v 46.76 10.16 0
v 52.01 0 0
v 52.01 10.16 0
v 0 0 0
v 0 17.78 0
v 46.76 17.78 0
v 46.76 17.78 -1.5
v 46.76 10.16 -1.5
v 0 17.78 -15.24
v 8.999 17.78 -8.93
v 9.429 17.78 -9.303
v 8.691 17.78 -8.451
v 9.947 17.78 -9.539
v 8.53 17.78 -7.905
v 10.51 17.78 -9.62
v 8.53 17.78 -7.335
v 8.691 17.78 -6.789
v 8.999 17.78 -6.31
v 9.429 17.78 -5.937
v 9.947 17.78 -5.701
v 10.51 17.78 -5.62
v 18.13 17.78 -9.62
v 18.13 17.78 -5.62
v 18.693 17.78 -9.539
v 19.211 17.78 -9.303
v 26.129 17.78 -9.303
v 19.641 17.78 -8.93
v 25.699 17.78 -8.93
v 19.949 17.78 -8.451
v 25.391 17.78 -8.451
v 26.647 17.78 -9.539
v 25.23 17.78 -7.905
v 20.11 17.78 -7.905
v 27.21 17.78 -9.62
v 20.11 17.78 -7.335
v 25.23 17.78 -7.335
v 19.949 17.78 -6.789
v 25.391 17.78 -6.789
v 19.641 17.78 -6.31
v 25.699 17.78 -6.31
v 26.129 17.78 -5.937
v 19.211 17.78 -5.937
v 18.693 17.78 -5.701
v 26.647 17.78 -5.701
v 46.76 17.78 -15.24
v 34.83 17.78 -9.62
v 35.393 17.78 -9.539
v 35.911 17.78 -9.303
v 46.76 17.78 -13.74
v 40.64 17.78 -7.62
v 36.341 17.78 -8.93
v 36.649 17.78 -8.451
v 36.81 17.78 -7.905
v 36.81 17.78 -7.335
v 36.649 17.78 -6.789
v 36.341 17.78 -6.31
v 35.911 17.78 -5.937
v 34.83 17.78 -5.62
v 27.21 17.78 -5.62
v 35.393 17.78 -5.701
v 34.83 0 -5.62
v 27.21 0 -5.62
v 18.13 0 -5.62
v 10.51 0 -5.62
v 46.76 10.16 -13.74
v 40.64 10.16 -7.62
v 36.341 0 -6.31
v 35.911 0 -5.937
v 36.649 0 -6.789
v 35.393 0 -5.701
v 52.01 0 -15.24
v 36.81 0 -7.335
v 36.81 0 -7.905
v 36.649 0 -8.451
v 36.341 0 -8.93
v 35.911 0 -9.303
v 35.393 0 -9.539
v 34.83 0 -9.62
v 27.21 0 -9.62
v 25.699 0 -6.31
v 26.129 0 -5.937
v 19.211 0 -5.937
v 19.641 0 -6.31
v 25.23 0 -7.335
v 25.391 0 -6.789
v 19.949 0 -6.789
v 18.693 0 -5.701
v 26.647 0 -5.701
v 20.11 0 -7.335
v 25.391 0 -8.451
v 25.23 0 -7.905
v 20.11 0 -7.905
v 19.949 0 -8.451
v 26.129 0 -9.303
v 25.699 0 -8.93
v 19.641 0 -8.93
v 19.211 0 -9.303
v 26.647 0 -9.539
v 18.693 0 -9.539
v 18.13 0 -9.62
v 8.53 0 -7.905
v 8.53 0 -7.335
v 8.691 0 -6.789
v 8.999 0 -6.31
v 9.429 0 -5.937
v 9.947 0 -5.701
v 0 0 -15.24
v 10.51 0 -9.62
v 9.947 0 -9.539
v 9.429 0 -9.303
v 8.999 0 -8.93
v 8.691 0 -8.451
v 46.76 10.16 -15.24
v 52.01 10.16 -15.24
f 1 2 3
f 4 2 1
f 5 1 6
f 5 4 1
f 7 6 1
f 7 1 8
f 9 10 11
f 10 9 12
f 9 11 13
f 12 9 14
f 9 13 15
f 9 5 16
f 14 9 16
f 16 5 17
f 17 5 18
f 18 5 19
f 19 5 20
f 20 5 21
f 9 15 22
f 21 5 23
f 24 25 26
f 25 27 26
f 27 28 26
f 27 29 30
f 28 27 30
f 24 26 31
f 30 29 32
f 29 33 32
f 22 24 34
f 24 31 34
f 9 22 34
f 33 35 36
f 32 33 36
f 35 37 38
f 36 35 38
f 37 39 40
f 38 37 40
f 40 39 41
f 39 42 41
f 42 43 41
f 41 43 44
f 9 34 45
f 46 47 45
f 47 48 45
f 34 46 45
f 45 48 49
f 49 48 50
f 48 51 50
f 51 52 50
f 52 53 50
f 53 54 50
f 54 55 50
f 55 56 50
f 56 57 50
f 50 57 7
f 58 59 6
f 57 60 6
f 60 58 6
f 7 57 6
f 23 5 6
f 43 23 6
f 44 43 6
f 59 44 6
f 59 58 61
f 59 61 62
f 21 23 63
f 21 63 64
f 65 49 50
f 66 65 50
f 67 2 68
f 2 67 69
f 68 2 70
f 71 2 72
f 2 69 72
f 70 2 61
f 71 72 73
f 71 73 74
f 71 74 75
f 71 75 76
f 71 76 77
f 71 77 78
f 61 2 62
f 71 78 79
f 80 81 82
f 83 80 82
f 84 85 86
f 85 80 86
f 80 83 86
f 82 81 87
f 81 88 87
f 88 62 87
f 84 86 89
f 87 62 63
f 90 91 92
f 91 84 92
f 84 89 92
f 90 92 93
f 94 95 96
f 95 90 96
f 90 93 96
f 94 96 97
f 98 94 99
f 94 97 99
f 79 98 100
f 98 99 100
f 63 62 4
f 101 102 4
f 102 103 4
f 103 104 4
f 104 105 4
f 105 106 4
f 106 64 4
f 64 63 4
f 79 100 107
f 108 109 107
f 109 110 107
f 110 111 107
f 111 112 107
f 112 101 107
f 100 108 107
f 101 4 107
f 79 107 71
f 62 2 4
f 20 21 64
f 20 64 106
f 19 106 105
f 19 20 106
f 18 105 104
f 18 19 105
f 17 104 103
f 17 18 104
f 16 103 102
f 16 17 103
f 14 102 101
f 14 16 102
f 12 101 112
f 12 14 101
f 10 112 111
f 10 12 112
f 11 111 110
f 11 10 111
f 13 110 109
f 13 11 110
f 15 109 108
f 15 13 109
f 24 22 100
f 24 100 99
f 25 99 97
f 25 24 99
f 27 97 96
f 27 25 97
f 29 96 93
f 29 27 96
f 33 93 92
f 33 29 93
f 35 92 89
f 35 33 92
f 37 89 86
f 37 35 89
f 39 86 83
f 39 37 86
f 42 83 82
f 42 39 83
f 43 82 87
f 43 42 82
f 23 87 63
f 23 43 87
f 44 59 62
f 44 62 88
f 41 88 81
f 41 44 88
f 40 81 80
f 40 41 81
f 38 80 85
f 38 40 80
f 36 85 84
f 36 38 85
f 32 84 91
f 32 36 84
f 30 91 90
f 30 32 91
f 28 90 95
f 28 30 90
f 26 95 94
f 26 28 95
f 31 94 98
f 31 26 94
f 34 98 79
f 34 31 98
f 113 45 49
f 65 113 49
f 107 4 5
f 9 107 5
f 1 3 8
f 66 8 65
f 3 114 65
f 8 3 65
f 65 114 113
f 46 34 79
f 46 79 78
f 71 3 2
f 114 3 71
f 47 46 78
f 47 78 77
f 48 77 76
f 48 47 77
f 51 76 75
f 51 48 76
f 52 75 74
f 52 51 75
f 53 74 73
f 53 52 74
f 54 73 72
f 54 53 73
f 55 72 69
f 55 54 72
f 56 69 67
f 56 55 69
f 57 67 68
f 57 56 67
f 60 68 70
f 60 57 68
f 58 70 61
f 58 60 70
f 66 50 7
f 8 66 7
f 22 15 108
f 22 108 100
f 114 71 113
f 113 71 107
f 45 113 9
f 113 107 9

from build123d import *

# Parameters (mm, degrees)
SKETCH1_W           = 48.26
SKETCH1_H           = 17.78
BOSS_EXTRUDE1_DEPTH = 15.24
CUT_EXTRUDE1_DEPTH  = 7.62
CUT_EXTRUDE2_DEPTH  = 54.641528688
SKETCH5_W           = 15.24
SKETCH5_H           = 10.16
BOSS_EXTRUDE2_DEPTH = 3.75
CUT_EXTRUDE5_DEPTH  = 7.62
CUT_EXTRUDE7_DEPTH  = 7.62


with BuildPart() as part:
    # Sketch1 → Boss-Extrude1 (new body)
    with BuildSketch(Plane.XY):
        with Locations((24.13, 8.89)):
            Rectangle(SKETCH1_W, SKETCH1_H)
    extrude(amount=-BOSS_EXTRUDE1_DEPTH)

    # Sketch3 → Cut-Extrude1 (cut)
    with BuildSketch(Plane(origin=(0, 17.78, 0), x_dir=(1, 0, 0), z_dir=(0, 1, 0))):
        Polygon((48.26, 15.24), (40.64, 7.62), (48.26, 0), align=None)
    extrude(amount=-CUT_EXTRUDE1_DEPTH, mode=Mode.SUBTRACT)

    # Sketch4 → Cut-Extrude2 (cut, through all)
    with BuildSketch(Plane(origin=(0, 17.78, 0), x_dir=(1, 0, 0), z_dir=(0, 1, 0))):
        with BuildLine():
            Line((34.83, 5.62), (27.21, 5.62))
            ThreePointArc((27.21, 5.62), (25.21, 7.62), (27.21, 9.62))
            Line((27.21, 9.62), (34.83, 9.62))
            ThreePointArc((34.83, 9.62), (36.83, 7.62), (34.83, 5.62))
        make_face()
        with BuildLine():
            Line((18.13, 5.62), (10.51, 5.62))
            ThreePointArc((10.51, 5.62), (8.51, 7.62), (10.51, 9.62))
            Line((10.51, 9.62), (18.13, 9.62))
            ThreePointArc((18.13, 9.62), (20.13, 7.62), (18.13, 5.62))
        make_face()
    extrude(amount=-CUT_EXTRUDE2_DEPTH, mode=Mode.SUBTRACT)

    # Sketch5 → Boss-Extrude2 (add)
    with BuildSketch(Plane(origin=(48.26, 0, 0), x_dir=(0, 0, -1), z_dir=(1, 0, 0))):
        with Locations((7.62, 5.08)):
            Rectangle(SKETCH5_W, SKETCH5_H)
    extrude(amount=BOSS_EXTRUDE2_DEPTH)

    # Sketch6 → Cut-Extrude5 (cut)
    with BuildSketch(Plane(origin=(0, 17.78, 0), x_dir=(1, 0, 0), z_dir=(0, 1, 0))):
        Polygon((48.26, 0), (46.76, 0), (46.76, 1.5), align=None)
    extrude(amount=-CUT_EXTRUDE5_DEPTH, mode=Mode.SUBTRACT)

    # Sketch7 → Cut-Extrude7 (cut)
    with BuildSketch(Plane(origin=(0, 17.78, 0), x_dir=(1, 0, 0), z_dir=(0, 1, 0))):
        Polygon((48.26, 15.24), (46.76, 15.24), (46.76, 13.74), align=None)
    extrude(amount=-CUT_EXTRUDE7_DEPTH, mode=Mode.SUBTRACT)


solid = part.part
